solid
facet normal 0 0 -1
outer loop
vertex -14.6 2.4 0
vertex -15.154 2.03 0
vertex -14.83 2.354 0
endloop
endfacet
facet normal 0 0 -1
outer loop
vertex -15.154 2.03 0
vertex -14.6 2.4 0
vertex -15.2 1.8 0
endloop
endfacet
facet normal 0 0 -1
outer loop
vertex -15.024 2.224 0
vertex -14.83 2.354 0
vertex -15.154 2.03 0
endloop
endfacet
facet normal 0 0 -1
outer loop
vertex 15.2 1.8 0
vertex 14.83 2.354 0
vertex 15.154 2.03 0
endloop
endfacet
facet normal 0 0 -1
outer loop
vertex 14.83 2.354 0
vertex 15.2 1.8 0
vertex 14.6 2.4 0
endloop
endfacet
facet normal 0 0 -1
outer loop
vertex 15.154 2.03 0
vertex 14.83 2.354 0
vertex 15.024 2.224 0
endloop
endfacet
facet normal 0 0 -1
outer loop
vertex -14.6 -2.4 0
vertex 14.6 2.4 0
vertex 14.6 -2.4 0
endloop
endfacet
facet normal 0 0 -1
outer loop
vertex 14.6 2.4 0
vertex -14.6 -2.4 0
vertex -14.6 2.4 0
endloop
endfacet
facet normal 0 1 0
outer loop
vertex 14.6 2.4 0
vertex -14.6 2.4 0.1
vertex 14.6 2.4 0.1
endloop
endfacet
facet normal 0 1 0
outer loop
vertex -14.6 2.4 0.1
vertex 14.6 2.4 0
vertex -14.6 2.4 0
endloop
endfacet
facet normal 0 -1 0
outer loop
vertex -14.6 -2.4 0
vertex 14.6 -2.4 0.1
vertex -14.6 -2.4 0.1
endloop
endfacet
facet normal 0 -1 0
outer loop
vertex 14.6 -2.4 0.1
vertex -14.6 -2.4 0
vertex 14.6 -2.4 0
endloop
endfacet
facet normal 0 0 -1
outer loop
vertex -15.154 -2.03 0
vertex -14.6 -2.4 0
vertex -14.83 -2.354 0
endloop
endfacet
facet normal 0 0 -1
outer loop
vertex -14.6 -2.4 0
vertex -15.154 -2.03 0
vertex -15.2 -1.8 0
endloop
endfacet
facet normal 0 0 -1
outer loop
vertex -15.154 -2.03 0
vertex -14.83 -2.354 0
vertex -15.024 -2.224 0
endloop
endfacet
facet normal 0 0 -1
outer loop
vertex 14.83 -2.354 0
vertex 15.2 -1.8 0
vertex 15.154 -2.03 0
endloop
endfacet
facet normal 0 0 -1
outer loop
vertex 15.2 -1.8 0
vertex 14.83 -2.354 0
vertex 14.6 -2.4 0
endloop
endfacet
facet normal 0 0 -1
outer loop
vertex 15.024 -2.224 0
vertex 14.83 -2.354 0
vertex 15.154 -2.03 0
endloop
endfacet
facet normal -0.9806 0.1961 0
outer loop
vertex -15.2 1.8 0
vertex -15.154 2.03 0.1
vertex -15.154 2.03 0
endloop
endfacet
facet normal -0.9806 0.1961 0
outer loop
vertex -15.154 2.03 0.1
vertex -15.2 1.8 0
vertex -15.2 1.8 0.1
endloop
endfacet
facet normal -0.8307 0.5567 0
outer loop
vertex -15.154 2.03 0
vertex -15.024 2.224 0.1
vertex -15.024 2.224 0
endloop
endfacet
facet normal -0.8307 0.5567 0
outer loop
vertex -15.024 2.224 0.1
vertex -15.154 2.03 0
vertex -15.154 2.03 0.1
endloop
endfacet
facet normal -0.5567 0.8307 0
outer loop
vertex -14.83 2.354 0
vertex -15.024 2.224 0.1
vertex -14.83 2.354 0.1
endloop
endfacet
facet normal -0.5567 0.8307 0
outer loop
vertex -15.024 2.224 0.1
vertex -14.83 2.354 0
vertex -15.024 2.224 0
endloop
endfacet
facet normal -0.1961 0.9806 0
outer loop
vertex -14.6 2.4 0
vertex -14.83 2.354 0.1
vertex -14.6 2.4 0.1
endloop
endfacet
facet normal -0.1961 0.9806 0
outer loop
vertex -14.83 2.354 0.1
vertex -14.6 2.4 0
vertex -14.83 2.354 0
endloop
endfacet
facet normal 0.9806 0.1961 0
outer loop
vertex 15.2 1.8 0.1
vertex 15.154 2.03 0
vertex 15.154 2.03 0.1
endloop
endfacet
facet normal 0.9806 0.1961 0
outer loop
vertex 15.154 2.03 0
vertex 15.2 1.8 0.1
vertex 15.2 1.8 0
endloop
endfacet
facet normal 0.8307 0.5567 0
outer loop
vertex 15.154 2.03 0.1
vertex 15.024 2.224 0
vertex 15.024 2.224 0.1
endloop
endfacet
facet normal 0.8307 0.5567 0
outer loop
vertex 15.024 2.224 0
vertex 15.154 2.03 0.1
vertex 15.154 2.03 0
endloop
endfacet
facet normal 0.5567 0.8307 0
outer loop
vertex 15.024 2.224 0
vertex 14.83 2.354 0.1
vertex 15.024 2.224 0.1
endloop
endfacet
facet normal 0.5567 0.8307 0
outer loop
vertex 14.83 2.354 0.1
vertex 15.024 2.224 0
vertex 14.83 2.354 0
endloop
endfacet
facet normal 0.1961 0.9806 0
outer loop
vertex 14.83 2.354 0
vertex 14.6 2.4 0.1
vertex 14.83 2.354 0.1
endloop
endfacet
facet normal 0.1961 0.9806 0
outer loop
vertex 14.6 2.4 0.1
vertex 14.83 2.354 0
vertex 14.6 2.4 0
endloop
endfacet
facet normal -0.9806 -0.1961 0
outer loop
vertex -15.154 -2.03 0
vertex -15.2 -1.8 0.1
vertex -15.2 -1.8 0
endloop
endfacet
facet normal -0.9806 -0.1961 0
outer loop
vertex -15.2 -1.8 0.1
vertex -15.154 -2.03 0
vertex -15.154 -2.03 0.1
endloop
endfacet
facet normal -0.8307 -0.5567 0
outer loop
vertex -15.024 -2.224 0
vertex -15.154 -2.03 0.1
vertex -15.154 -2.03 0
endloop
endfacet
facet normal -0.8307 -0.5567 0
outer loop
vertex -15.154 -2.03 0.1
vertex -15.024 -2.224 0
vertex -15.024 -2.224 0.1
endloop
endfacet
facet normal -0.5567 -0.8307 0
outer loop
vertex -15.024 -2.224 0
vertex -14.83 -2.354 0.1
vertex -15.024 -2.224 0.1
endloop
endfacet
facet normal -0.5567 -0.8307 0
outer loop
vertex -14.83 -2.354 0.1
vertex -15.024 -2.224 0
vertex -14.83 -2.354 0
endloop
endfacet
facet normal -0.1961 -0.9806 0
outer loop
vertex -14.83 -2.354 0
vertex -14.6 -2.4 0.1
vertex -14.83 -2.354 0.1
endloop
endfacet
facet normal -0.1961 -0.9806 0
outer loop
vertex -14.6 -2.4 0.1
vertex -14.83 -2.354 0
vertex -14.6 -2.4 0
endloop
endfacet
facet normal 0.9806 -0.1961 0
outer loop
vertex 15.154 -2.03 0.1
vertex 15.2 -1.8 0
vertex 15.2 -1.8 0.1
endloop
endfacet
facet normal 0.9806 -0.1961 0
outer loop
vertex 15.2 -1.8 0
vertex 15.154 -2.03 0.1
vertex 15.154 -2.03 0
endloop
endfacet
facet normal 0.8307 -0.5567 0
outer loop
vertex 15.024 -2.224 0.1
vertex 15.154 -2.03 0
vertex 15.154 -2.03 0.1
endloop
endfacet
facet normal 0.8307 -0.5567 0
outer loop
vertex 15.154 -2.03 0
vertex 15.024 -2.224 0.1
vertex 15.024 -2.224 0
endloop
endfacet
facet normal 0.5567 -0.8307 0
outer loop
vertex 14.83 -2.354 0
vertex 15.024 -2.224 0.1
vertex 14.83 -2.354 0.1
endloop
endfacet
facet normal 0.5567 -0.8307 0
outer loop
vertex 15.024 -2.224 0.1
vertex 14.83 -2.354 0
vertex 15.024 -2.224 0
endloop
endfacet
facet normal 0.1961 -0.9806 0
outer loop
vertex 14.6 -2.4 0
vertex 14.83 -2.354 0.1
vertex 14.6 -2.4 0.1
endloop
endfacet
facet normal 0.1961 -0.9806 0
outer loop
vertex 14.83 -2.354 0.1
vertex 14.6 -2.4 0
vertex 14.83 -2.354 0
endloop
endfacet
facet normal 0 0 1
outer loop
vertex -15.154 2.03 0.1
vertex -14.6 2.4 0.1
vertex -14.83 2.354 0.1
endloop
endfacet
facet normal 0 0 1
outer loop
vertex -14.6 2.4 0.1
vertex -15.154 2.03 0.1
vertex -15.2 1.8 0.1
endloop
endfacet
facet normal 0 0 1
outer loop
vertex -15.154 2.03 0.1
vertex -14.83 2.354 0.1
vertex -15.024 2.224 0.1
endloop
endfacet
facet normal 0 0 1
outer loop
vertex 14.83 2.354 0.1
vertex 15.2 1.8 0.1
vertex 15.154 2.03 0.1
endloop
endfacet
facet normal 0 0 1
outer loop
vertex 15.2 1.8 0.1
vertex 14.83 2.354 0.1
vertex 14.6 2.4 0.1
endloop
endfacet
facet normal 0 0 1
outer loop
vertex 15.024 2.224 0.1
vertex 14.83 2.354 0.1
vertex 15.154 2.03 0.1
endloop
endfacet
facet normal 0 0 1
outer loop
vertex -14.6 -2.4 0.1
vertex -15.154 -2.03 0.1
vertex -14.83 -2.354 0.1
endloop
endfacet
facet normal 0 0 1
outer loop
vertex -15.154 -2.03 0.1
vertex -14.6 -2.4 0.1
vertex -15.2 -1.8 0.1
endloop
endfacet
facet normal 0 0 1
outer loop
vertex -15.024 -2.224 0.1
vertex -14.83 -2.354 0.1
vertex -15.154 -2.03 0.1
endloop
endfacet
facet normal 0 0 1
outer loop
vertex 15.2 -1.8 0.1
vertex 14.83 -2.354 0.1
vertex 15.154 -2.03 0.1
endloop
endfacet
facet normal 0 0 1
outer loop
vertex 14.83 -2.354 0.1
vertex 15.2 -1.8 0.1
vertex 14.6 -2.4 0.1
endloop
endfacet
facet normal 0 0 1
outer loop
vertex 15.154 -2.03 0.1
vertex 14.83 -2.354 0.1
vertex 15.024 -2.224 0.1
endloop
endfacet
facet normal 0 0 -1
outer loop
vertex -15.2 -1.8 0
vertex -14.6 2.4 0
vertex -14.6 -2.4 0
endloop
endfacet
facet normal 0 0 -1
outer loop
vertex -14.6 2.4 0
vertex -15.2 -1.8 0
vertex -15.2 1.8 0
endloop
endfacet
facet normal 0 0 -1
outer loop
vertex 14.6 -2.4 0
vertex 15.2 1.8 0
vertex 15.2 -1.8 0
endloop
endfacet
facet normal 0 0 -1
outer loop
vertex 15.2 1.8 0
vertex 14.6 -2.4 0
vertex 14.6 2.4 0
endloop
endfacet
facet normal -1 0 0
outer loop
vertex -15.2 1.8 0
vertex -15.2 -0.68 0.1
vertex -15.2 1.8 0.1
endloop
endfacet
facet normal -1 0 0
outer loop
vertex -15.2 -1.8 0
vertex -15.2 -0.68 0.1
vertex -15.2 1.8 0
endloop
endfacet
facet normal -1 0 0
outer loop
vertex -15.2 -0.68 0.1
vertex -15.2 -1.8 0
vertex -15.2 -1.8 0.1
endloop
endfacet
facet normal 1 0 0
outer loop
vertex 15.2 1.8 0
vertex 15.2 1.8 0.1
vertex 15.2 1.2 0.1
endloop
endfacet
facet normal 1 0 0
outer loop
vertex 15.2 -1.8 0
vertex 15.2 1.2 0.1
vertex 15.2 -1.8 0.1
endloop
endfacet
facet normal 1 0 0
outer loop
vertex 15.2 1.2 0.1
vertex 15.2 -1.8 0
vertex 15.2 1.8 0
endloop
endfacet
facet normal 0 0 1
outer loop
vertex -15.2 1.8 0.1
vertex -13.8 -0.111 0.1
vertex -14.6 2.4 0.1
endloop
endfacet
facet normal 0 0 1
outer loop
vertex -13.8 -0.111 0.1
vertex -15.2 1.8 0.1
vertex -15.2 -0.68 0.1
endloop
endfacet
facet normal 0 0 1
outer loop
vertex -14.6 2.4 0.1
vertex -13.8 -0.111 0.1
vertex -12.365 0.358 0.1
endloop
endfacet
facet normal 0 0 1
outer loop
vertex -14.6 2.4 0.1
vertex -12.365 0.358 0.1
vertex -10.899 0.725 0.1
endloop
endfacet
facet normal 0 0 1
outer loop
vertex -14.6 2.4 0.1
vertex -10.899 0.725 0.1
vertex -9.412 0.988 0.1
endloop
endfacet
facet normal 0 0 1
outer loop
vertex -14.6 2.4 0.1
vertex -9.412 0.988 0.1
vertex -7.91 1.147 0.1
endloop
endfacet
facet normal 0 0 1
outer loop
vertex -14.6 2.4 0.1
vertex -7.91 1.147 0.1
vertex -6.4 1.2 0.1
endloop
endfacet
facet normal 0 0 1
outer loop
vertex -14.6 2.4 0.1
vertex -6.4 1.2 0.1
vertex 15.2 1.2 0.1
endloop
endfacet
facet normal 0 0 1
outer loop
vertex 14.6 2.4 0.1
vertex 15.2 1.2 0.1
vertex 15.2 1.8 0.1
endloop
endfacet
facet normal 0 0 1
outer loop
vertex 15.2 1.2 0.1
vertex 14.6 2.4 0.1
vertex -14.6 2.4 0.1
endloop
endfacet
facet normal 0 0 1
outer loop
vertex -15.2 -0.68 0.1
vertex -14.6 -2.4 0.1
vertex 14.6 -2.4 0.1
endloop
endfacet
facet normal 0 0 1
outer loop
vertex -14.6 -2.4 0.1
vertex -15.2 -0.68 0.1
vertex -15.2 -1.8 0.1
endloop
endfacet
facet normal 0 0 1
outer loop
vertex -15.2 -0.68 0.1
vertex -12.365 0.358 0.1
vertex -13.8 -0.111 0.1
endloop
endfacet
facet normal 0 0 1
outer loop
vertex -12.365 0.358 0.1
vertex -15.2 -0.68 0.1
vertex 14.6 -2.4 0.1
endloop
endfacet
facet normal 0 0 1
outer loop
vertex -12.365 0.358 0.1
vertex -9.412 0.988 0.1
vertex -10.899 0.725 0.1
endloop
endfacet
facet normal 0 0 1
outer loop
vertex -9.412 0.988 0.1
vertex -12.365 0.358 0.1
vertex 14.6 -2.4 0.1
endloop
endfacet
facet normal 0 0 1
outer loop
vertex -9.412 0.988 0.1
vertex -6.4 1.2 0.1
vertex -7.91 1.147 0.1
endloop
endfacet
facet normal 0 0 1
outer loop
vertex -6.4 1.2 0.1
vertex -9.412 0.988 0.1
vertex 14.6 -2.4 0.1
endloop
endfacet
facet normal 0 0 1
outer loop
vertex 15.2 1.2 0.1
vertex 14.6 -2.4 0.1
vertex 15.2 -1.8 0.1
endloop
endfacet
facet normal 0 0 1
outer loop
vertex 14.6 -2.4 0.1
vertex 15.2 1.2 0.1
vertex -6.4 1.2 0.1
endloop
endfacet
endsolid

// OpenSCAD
// file: ../p/box3u12.scad
use <../lib.scad>
function ldraw_lib__box3u12() = [
// 0 Box with 3 Parallel Faces without Any Edges
// 0 Name: box3u12.dat
// 0 Author: J.C. Tchang [tchang]
// 0 !LDRAW_ORG Primitive UPDATE 2014-02
// 0 !LICENSE Licensed under CC BY 4.0 : see CAreadme.txt
// 
// 0 BFC CERTIFY CCW
  [0,"BFC","CERTIFY"],
  [0,"BFC","CCW"],
// 
// 0 !HISTORY 2014-12-23 [PTadmin] Official Update 2014-02
// 
// 
// 4 16 -1 1 1 1 1 1 1 1 -1 -1 1 -1
  [4,16,-1,1,1,1,1,1,1,1,-1,-1,1,-1],
// 4 16 -1 1 1 -1 0 1 1 0 1 1 1 1
  [4,16,-1,1,1,-1,0,1,1,0,1,1,1,1],
// 4 16 1 1 -1 1 0 -1 -1 0 -1 -1 1 -1
  [4,16,1,1,-1,1,0,-1,-1,0,-1,-1,1,-1],
];
module ldraw_lib__box3u12(step=0, col=false, unit=2/5, alt=false, line=0.2, solid=!$preview)
    makepoly(ldraw_lib__box3u12(), step=step, col=col, unit=unit, alt=alt, line=line, solid=solid);
ldraw_lib__box3u12(line=0.2);
// file: ../p/1-4cyli.scad
use <../lib.scad>
function ldraw_lib__1_4cyli() = [
// 0 Cylinder 0.25
// 0 Name: 1-4cyli.dat
// 0 Author: James Jessiman
// 0 !LDRAW_ORG Primitive UPDATE 2012-01
// 0 !LICENSE Licensed under CC BY 4.0 : see CAreadme.txt
// 
// 0 BFC CERTIFY CCW
  [0,"BFC","CERTIFY"],
  [0,"BFC","CCW"],
// 
// 0 !HISTORY 2002-03-23 [sbliss] Added BFC statement.
// 0 !HISTORY 2002-04-25 [PTadmin] Official Update 2002-02
// 0 !HISTORY 2007-06-22 [PTadmin] Header formatted for Contributor Agreement
// 0 !HISTORY 2008-07-01 [PTadmin] Official Update 2008-01
// 0 !HISTORY 2012-02-16 [Philo] Changed to CCW
// 0 !HISTORY 2012-03-30 [PTadmin] Official Update 2012-01
// 
// 
// 4 16 1 1 0 0.9239 1 0.3827 0.9239 0 0.3827 1 0 0
  [4,16,1,1,0,0.9239,1,0.3827,0.9239,0,0.3827,1,0,0],
// 5 24 1 0 0 1 1 0 0.9239 0 0.3827 1 0 -1
  [5,24,1,0,0,1,1,0,0.9239,0,0.3827,1,0,-1],
// 4 16 0.9239 1 0.3827 0.7071 1 0.7071 0.7071 0 0.7071 0.9239 0 0.3827
  [4,16,0.9239,1,0.3827,0.7071,1,0.7071,0.7071,0,0.7071,0.9239,0,0.3827],
// 5 24 0.9239 0 0.3827 0.9239 1 0.3827 0.7071 0 0.7071 1 0 0
  [5,24,0.9239,0,0.3827,0.9239,1,0.3827,0.7071,0,0.7071,1,0,0],
// 4 16 0.7071 1 0.7071 0.3827 1 0.9239 0.3827 0 0.9239 0.7071 0 0.7071
  [4,16,0.7071,1,0.7071,0.3827,1,0.9239,0.3827,0,0.9239,0.7071,0,0.7071],
// 5 24 0.7071 0 0.7071 0.7071 1 0.7071 0.3827 0 0.9239 0.9239 0 0.3827
  [5,24,0.7071,0,0.7071,0.7071,1,0.7071,0.3827,0,0.9239,0.9239,0,0.3827],
// 4 16 0.3827 1 0.9239 0 1 1 0 0 1 0.3827 0 0.9239
  [4,16,0.3827,1,0.9239,0,1,1,0,0,1,0.3827,0,0.9239],
// 5 24 0.3827 0 0.9239 0.3827 1 0.9239 0 0 1 0.7071 0 0.7071
  [5,24,0.3827,0,0.9239,0.3827,1,0.9239,0,0,1,0.7071,0,0.7071],
// 5 24 0 0 1 0 1 1 0.3827 0 0.9239 -1 0 1
  [5,24,0,0,1,0,1,1,0.3827,0,0.9239,-1,0,1],
];
module ldraw_lib__1_4cyli(step=0, col=false, unit=2/5, alt=false, line=0.2, solid=!$preview)
    makepoly(ldraw_lib__1_4cyli(), step=step, col=col, unit=unit, alt=alt, line=line, solid=solid);
ldraw_lib__1_4cyli(line=0.2);
// file: ../p/1-4chrd.scad
use <../lib.scad>
function ldraw_lib__1_4chrd() = [
// 0 Chord 0.25
// 0 Name: 1-4chrd.dat
// 0 Author: Max Martin Richter [MMR1988]
// 0 !LDRAW_ORG Primitive UPDATE 2023-05
// 0 !LICENSE Licensed under CC BY 4.0 : see CAreadme.txt
// 
// 0 BFC CERTIFY CCW
  [0,"BFC","CERTIFY"],
  [0,"BFC","CCW"],
// 
// 0 !HISTORY 2004-04-22 [PTadmin] Official Update 2004-02
// 0 !HISTORY 2007-10-09 [PTadmin] Header formatted for Contributor Agreement
// 0 !HISTORY 2008-07-01 [PTadmin] Official Update 2008-01
// 0 !HISTORY 2012-08-02 [MMR1988] Re-creation with PrimGen2 and Rectifier
// 0 !HISTORY 2012-08-09 [PTadmin] Official Update 2012-02
// 0 !HISTORY 2023-10-27 [OrionP] Change author to MMR1988 from hafhead
// 0 !HISTORY 2023-10-31 [OrionP] Official Update 2023-05
// 
// 4 16 0.9239 0 0.3827 0.3827 0 0.9239 0 0 1 1 0 0
  [4,16,0.9239,0,0.3827,0.3827,0,0.9239,0,0,1,1,0,0],
// 3 16 0.7071 0 0.7071 0.3827 0 0.9239 0.9239 0 0.3827
  [3,16,0.7071,0,0.7071,0.3827,0,0.9239,0.9239,0,0.3827],
];
module ldraw_lib__1_4chrd(step=0, col=false, unit=2/5, alt=false, line=0.2, solid=!$preview)
    makepoly(ldraw_lib__1_4chrd(), step=step, col=col, unit=unit, alt=alt, line=line, solid=solid);
ldraw_lib__1_4chrd(line=0.2);
// main file
use <../lib.scad>
use <../p/1-4chrd.scad>
use <../p/1-4cyli.scad>
use <../p/box3u12.scad>
function ldraw_lib__6221655r() = [
// 0 Sticker  0.6 x  3.8 with Red Stripe on Black Background Right
// 0 Name: 6221655r.dat
// 0 Author: Massimo Maso [Sirio]
// 0 !LDRAW_ORG Part UPDATE 2024-09
// 0 !LICENSE Licensed under CC BY 4.0 : see CAreadme.txt
// 
// 0 BFC CERTIFY CCW
  [0,"BFC","CERTIFY"],
  [0,"BFC","CCW"],
// 
// 0 !KEYWORDS 3.0, 911 RSR, Porsche, Set 75888, Speed Champions, Turbo
// 
// 0 !HISTORY 2024-10-27 [OrionP] Official Update 2024-09
// 
// 0 // Primitives
// 1 16 -36.5 0 4.5 -1.5 0 0 0 -1 0 0 0 1.5 1-4chrd.dat
  [1,16,-36.5,0,4.5,-1.5,0,0,0,-1,0,0,0,1.5, ldraw_lib__1_4chrd()],
// 1 16 36.5 0 4.5 1.5 0 0 0 -1 0 0 0 1.5 1-4chrd.dat
  [1,16,36.5,0,4.5,1.5,0,0,0,-1,0,0,0,1.5, ldraw_lib__1_4chrd()],
// 1 16 0 -.25 0 36.5 0 0 0 .25 0 0 0 6 box3u12.dat
  [1,16,0,-.25,0,36.5,0,0,0,.25,0,0,0,6, ldraw_lib__box3u12()],
// 1 16 -36.5 0 -4.5 -1.5 0 0 0 -1 0 0 0 -1.5 1-4chrd.dat
  [1,16,-36.5,0,-4.5,-1.5,0,0,0,-1,0,0,0,-1.5, ldraw_lib__1_4chrd()],
// 1 16 36.5 0 -4.5 1.5 0 0 0 -1 0 0 0 -1.5 1-4chrd.dat
  [1,16,36.5,0,-4.5,1.5,0,0,0,-1,0,0,0,-1.5, ldraw_lib__1_4chrd()],
// 1 16 -36.5 -.25 4.5 -1.5 0 0 0 .25 0 0 0 1.5 1-4cyli.dat
  [1,16,-36.5,-.25,4.5,-1.5,0,0,0,.25,0,0,0,1.5, ldraw_lib__1_4cyli()],
// 1 16 36.5 -.25 4.5 1.5 0 0 0 .25 0 0 0 1.5 1-4cyli.dat
  [1,16,36.5,-.25,4.5,1.5,0,0,0,.25,0,0,0,1.5, ldraw_lib__1_4cyli()],
// 1 16 -36.5 -.25 -4.5 -1.5 0 0 0 .25 0 0 0 -1.5 1-4cyli.dat
  [1,16,-36.5,-.25,-4.5,-1.5,0,0,0,.25,0,0,0,-1.5, ldraw_lib__1_4cyli()],
// 1 16 36.5 -.25 -4.5 1.5 0 0 0 .25 0 0 0 -1.5 1-4cyli.dat
  [1,16,36.5,-.25,-4.5,1.5,0,0,0,.25,0,0,0,-1.5, ldraw_lib__1_4cyli()],
// 1 0 -36.5 -.25 4.5 -1.5 0 0 0 1 0 0 0 1.5 1-4chrd.dat
  [1,0,-36.5,-.25,4.5,-1.5,0,0,0,1,0,0,0,1.5, ldraw_lib__1_4chrd()],
// 1 0 36.5 -.25 4.5 1.5 0 0 0 1 0 0 0 1.5 1-4chrd.dat
  [1,0,36.5,-.25,4.5,1.5,0,0,0,1,0,0,0,1.5, ldraw_lib__1_4chrd()],
// 1 4 -36.5 -.25 -4.5 -1.5 0 0 0 1 0 0 0 -1.5 1-4chrd.dat
  [1,4,-36.5,-.25,-4.5,-1.5,0,0,0,1,0,0,0,-1.5, ldraw_lib__1_4chrd()],
// 1 4 36.5 -.25 -4.5 1.5 0 0 0 1 0 0 0 -1.5 1-4chrd.dat
  [1,4,36.5,-.25,-4.5,1.5,0,0,0,1,0,0,0,-1.5, ldraw_lib__1_4chrd()],
// 0 // Bottom face
// 4 16 -36.5 0 6 -36.5 0 -6 -38 0 -4.5 -38 0 4.5
  [4,16,-36.5,0,6,-36.5,0,-6,-38,0,-4.5,-38,0,4.5],
// 4 16 36.5 0 6 38 0 4.5 38 0 -4.5 36.5 0 -6
  [4,16,36.5,0,6,38,0,4.5,38,0,-4.5,36.5,0,-6],
// 0 // Lateral face
// 3 16 -38 0 4.5 -38 -.25 -1.7 -38 -.25 4.5
  [3,16,-38,0,4.5,-38,-.25,-1.7,-38,-.25,4.5],
// 4 16 -38 0 4.5 -38 0 -4.5 -38 -.25 -4.5 -38 -.25 -1.7
  [4,16,-38,0,4.5,-38,0,-4.5,-38,-.25,-4.5,-38,-.25,-1.7],
// 3 16 38 0 4.5 38 -.25 4.5 38 -.25 3
  [3,16,38,0,4.5,38,-.25,4.5,38,-.25,3],
// 4 16 38 0 4.5 38 -.25 3 38 -.25 -4.5 38 0 -4.5
  [4,16,38,0,4.5,38,-.25,3,38,-.25,-4.5,38,0,-4.5],
// 0 // Top face
// 0 // Black faces
// 4 0 -36.5 -.25 6 -38 -.25 4.5 -38 -.25 -1.7 -34.5012 -.25 -.2787
  [4,0,-36.5,-.25,6,-38,-.25,4.5,-38,-.25,-1.7,-34.5012,-.25,-.2787],
// 3 0 -36.5 -.25 6 -34.5012 -.25 -.2787 -30.9114 -.25 .8939
  [3,0,-36.5,-.25,6,-34.5012,-.25,-.2787,-30.9114,-.25,.8939],
// 3 0 -36.5 -.25 6 -30.9114 -.25 .8939 -27.2482 -.25 1.8119
  [3,0,-36.5,-.25,6,-30.9114,-.25,.8939,-27.2482,-.25,1.8119],
// 3 0 -36.5 -.25 6 -27.2482 -.25 1.8119 -23.5297 -.25 2.4709
  [3,0,-36.5,-.25,6,-27.2482,-.25,1.8119,-23.5297,-.25,2.4709],
// 3 0 -36.5 -.25 6 -23.5297 -.25 2.4709 -19.7741 -.25 2.8676
  [3,0,-36.5,-.25,6,-23.5297,-.25,2.4709,-19.7741,-.25,2.8676],
// 3 0 -36.5 -.25 6 -19.7741 -.25 2.8676 -16 -.25 3
  [3,0,-36.5,-.25,6,-19.7741,-.25,2.8676,-16,-.25,3],
// 3 0 -36.5 -.25 6 -16 -.25 3 38 -.25 3
  [3,0,-36.5,-.25,6,-16,-.25,3,38,-.25,3],
// 4 0 -36.5 -.25 6 38 -.25 3 38 -.25 4.5 36.5 -.25 6
  [4,0,-36.5,-.25,6,38,-.25,3,38,-.25,4.5,36.5,-.25,6],
// 0 // Red faces
// 4 4 36.5 -.25 -6 -38 -.25 -1.7 -38 -.25 -4.5 -36.5 -.25 -6
  [4,4,36.5,-.25,-6,-38,-.25,-1.7,-38,-.25,-4.5,-36.5,-.25,-6],
// 4 4 36.5 -.25 -6 -30.9114 -.25 .8939 -34.5012 -.25 -.2787 -38 -.25 -1.7
  [4,4,36.5,-.25,-6,-30.9114,-.25,.8939,-34.5012,-.25,-.2787,-38,-.25,-1.7],
// 4 4 36.5 -.25 -6 -23.5297 -.25 2.4709 -27.2482 -.25 1.8119 -30.9114 -.25 .8939
  [4,4,36.5,-.25,-6,-23.5297,-.25,2.4709,-27.2482,-.25,1.8119,-30.9114,-.25,.8939],
// 4 4 36.5 -.25 -6 -16 -.25 3 -19.7741 -.25 2.8676 -23.5297 -.25 2.4709
  [4,4,36.5,-.25,-6,-16,-.25,3,-19.7741,-.25,2.8676,-23.5297,-.25,2.4709],
// 4 4 36.5 -.25 -6 38 -.25 -4.5 38 -.25 3 -16 -.25 3
  [4,4,36.5,-.25,-6,38,-.25,-4.5,38,-.25,3,-16,-.25,3],
];
module ldraw_lib__6221655r(step=0, col=false, unit=2/5, alt=false, line=0.2, solid=!$preview)
    makepoly(ldraw_lib__6221655r(), step=step, col=col, unit=unit, alt=alt, line=line, solid=solid);
ldraw_lib__6221655r(line=0.2);
